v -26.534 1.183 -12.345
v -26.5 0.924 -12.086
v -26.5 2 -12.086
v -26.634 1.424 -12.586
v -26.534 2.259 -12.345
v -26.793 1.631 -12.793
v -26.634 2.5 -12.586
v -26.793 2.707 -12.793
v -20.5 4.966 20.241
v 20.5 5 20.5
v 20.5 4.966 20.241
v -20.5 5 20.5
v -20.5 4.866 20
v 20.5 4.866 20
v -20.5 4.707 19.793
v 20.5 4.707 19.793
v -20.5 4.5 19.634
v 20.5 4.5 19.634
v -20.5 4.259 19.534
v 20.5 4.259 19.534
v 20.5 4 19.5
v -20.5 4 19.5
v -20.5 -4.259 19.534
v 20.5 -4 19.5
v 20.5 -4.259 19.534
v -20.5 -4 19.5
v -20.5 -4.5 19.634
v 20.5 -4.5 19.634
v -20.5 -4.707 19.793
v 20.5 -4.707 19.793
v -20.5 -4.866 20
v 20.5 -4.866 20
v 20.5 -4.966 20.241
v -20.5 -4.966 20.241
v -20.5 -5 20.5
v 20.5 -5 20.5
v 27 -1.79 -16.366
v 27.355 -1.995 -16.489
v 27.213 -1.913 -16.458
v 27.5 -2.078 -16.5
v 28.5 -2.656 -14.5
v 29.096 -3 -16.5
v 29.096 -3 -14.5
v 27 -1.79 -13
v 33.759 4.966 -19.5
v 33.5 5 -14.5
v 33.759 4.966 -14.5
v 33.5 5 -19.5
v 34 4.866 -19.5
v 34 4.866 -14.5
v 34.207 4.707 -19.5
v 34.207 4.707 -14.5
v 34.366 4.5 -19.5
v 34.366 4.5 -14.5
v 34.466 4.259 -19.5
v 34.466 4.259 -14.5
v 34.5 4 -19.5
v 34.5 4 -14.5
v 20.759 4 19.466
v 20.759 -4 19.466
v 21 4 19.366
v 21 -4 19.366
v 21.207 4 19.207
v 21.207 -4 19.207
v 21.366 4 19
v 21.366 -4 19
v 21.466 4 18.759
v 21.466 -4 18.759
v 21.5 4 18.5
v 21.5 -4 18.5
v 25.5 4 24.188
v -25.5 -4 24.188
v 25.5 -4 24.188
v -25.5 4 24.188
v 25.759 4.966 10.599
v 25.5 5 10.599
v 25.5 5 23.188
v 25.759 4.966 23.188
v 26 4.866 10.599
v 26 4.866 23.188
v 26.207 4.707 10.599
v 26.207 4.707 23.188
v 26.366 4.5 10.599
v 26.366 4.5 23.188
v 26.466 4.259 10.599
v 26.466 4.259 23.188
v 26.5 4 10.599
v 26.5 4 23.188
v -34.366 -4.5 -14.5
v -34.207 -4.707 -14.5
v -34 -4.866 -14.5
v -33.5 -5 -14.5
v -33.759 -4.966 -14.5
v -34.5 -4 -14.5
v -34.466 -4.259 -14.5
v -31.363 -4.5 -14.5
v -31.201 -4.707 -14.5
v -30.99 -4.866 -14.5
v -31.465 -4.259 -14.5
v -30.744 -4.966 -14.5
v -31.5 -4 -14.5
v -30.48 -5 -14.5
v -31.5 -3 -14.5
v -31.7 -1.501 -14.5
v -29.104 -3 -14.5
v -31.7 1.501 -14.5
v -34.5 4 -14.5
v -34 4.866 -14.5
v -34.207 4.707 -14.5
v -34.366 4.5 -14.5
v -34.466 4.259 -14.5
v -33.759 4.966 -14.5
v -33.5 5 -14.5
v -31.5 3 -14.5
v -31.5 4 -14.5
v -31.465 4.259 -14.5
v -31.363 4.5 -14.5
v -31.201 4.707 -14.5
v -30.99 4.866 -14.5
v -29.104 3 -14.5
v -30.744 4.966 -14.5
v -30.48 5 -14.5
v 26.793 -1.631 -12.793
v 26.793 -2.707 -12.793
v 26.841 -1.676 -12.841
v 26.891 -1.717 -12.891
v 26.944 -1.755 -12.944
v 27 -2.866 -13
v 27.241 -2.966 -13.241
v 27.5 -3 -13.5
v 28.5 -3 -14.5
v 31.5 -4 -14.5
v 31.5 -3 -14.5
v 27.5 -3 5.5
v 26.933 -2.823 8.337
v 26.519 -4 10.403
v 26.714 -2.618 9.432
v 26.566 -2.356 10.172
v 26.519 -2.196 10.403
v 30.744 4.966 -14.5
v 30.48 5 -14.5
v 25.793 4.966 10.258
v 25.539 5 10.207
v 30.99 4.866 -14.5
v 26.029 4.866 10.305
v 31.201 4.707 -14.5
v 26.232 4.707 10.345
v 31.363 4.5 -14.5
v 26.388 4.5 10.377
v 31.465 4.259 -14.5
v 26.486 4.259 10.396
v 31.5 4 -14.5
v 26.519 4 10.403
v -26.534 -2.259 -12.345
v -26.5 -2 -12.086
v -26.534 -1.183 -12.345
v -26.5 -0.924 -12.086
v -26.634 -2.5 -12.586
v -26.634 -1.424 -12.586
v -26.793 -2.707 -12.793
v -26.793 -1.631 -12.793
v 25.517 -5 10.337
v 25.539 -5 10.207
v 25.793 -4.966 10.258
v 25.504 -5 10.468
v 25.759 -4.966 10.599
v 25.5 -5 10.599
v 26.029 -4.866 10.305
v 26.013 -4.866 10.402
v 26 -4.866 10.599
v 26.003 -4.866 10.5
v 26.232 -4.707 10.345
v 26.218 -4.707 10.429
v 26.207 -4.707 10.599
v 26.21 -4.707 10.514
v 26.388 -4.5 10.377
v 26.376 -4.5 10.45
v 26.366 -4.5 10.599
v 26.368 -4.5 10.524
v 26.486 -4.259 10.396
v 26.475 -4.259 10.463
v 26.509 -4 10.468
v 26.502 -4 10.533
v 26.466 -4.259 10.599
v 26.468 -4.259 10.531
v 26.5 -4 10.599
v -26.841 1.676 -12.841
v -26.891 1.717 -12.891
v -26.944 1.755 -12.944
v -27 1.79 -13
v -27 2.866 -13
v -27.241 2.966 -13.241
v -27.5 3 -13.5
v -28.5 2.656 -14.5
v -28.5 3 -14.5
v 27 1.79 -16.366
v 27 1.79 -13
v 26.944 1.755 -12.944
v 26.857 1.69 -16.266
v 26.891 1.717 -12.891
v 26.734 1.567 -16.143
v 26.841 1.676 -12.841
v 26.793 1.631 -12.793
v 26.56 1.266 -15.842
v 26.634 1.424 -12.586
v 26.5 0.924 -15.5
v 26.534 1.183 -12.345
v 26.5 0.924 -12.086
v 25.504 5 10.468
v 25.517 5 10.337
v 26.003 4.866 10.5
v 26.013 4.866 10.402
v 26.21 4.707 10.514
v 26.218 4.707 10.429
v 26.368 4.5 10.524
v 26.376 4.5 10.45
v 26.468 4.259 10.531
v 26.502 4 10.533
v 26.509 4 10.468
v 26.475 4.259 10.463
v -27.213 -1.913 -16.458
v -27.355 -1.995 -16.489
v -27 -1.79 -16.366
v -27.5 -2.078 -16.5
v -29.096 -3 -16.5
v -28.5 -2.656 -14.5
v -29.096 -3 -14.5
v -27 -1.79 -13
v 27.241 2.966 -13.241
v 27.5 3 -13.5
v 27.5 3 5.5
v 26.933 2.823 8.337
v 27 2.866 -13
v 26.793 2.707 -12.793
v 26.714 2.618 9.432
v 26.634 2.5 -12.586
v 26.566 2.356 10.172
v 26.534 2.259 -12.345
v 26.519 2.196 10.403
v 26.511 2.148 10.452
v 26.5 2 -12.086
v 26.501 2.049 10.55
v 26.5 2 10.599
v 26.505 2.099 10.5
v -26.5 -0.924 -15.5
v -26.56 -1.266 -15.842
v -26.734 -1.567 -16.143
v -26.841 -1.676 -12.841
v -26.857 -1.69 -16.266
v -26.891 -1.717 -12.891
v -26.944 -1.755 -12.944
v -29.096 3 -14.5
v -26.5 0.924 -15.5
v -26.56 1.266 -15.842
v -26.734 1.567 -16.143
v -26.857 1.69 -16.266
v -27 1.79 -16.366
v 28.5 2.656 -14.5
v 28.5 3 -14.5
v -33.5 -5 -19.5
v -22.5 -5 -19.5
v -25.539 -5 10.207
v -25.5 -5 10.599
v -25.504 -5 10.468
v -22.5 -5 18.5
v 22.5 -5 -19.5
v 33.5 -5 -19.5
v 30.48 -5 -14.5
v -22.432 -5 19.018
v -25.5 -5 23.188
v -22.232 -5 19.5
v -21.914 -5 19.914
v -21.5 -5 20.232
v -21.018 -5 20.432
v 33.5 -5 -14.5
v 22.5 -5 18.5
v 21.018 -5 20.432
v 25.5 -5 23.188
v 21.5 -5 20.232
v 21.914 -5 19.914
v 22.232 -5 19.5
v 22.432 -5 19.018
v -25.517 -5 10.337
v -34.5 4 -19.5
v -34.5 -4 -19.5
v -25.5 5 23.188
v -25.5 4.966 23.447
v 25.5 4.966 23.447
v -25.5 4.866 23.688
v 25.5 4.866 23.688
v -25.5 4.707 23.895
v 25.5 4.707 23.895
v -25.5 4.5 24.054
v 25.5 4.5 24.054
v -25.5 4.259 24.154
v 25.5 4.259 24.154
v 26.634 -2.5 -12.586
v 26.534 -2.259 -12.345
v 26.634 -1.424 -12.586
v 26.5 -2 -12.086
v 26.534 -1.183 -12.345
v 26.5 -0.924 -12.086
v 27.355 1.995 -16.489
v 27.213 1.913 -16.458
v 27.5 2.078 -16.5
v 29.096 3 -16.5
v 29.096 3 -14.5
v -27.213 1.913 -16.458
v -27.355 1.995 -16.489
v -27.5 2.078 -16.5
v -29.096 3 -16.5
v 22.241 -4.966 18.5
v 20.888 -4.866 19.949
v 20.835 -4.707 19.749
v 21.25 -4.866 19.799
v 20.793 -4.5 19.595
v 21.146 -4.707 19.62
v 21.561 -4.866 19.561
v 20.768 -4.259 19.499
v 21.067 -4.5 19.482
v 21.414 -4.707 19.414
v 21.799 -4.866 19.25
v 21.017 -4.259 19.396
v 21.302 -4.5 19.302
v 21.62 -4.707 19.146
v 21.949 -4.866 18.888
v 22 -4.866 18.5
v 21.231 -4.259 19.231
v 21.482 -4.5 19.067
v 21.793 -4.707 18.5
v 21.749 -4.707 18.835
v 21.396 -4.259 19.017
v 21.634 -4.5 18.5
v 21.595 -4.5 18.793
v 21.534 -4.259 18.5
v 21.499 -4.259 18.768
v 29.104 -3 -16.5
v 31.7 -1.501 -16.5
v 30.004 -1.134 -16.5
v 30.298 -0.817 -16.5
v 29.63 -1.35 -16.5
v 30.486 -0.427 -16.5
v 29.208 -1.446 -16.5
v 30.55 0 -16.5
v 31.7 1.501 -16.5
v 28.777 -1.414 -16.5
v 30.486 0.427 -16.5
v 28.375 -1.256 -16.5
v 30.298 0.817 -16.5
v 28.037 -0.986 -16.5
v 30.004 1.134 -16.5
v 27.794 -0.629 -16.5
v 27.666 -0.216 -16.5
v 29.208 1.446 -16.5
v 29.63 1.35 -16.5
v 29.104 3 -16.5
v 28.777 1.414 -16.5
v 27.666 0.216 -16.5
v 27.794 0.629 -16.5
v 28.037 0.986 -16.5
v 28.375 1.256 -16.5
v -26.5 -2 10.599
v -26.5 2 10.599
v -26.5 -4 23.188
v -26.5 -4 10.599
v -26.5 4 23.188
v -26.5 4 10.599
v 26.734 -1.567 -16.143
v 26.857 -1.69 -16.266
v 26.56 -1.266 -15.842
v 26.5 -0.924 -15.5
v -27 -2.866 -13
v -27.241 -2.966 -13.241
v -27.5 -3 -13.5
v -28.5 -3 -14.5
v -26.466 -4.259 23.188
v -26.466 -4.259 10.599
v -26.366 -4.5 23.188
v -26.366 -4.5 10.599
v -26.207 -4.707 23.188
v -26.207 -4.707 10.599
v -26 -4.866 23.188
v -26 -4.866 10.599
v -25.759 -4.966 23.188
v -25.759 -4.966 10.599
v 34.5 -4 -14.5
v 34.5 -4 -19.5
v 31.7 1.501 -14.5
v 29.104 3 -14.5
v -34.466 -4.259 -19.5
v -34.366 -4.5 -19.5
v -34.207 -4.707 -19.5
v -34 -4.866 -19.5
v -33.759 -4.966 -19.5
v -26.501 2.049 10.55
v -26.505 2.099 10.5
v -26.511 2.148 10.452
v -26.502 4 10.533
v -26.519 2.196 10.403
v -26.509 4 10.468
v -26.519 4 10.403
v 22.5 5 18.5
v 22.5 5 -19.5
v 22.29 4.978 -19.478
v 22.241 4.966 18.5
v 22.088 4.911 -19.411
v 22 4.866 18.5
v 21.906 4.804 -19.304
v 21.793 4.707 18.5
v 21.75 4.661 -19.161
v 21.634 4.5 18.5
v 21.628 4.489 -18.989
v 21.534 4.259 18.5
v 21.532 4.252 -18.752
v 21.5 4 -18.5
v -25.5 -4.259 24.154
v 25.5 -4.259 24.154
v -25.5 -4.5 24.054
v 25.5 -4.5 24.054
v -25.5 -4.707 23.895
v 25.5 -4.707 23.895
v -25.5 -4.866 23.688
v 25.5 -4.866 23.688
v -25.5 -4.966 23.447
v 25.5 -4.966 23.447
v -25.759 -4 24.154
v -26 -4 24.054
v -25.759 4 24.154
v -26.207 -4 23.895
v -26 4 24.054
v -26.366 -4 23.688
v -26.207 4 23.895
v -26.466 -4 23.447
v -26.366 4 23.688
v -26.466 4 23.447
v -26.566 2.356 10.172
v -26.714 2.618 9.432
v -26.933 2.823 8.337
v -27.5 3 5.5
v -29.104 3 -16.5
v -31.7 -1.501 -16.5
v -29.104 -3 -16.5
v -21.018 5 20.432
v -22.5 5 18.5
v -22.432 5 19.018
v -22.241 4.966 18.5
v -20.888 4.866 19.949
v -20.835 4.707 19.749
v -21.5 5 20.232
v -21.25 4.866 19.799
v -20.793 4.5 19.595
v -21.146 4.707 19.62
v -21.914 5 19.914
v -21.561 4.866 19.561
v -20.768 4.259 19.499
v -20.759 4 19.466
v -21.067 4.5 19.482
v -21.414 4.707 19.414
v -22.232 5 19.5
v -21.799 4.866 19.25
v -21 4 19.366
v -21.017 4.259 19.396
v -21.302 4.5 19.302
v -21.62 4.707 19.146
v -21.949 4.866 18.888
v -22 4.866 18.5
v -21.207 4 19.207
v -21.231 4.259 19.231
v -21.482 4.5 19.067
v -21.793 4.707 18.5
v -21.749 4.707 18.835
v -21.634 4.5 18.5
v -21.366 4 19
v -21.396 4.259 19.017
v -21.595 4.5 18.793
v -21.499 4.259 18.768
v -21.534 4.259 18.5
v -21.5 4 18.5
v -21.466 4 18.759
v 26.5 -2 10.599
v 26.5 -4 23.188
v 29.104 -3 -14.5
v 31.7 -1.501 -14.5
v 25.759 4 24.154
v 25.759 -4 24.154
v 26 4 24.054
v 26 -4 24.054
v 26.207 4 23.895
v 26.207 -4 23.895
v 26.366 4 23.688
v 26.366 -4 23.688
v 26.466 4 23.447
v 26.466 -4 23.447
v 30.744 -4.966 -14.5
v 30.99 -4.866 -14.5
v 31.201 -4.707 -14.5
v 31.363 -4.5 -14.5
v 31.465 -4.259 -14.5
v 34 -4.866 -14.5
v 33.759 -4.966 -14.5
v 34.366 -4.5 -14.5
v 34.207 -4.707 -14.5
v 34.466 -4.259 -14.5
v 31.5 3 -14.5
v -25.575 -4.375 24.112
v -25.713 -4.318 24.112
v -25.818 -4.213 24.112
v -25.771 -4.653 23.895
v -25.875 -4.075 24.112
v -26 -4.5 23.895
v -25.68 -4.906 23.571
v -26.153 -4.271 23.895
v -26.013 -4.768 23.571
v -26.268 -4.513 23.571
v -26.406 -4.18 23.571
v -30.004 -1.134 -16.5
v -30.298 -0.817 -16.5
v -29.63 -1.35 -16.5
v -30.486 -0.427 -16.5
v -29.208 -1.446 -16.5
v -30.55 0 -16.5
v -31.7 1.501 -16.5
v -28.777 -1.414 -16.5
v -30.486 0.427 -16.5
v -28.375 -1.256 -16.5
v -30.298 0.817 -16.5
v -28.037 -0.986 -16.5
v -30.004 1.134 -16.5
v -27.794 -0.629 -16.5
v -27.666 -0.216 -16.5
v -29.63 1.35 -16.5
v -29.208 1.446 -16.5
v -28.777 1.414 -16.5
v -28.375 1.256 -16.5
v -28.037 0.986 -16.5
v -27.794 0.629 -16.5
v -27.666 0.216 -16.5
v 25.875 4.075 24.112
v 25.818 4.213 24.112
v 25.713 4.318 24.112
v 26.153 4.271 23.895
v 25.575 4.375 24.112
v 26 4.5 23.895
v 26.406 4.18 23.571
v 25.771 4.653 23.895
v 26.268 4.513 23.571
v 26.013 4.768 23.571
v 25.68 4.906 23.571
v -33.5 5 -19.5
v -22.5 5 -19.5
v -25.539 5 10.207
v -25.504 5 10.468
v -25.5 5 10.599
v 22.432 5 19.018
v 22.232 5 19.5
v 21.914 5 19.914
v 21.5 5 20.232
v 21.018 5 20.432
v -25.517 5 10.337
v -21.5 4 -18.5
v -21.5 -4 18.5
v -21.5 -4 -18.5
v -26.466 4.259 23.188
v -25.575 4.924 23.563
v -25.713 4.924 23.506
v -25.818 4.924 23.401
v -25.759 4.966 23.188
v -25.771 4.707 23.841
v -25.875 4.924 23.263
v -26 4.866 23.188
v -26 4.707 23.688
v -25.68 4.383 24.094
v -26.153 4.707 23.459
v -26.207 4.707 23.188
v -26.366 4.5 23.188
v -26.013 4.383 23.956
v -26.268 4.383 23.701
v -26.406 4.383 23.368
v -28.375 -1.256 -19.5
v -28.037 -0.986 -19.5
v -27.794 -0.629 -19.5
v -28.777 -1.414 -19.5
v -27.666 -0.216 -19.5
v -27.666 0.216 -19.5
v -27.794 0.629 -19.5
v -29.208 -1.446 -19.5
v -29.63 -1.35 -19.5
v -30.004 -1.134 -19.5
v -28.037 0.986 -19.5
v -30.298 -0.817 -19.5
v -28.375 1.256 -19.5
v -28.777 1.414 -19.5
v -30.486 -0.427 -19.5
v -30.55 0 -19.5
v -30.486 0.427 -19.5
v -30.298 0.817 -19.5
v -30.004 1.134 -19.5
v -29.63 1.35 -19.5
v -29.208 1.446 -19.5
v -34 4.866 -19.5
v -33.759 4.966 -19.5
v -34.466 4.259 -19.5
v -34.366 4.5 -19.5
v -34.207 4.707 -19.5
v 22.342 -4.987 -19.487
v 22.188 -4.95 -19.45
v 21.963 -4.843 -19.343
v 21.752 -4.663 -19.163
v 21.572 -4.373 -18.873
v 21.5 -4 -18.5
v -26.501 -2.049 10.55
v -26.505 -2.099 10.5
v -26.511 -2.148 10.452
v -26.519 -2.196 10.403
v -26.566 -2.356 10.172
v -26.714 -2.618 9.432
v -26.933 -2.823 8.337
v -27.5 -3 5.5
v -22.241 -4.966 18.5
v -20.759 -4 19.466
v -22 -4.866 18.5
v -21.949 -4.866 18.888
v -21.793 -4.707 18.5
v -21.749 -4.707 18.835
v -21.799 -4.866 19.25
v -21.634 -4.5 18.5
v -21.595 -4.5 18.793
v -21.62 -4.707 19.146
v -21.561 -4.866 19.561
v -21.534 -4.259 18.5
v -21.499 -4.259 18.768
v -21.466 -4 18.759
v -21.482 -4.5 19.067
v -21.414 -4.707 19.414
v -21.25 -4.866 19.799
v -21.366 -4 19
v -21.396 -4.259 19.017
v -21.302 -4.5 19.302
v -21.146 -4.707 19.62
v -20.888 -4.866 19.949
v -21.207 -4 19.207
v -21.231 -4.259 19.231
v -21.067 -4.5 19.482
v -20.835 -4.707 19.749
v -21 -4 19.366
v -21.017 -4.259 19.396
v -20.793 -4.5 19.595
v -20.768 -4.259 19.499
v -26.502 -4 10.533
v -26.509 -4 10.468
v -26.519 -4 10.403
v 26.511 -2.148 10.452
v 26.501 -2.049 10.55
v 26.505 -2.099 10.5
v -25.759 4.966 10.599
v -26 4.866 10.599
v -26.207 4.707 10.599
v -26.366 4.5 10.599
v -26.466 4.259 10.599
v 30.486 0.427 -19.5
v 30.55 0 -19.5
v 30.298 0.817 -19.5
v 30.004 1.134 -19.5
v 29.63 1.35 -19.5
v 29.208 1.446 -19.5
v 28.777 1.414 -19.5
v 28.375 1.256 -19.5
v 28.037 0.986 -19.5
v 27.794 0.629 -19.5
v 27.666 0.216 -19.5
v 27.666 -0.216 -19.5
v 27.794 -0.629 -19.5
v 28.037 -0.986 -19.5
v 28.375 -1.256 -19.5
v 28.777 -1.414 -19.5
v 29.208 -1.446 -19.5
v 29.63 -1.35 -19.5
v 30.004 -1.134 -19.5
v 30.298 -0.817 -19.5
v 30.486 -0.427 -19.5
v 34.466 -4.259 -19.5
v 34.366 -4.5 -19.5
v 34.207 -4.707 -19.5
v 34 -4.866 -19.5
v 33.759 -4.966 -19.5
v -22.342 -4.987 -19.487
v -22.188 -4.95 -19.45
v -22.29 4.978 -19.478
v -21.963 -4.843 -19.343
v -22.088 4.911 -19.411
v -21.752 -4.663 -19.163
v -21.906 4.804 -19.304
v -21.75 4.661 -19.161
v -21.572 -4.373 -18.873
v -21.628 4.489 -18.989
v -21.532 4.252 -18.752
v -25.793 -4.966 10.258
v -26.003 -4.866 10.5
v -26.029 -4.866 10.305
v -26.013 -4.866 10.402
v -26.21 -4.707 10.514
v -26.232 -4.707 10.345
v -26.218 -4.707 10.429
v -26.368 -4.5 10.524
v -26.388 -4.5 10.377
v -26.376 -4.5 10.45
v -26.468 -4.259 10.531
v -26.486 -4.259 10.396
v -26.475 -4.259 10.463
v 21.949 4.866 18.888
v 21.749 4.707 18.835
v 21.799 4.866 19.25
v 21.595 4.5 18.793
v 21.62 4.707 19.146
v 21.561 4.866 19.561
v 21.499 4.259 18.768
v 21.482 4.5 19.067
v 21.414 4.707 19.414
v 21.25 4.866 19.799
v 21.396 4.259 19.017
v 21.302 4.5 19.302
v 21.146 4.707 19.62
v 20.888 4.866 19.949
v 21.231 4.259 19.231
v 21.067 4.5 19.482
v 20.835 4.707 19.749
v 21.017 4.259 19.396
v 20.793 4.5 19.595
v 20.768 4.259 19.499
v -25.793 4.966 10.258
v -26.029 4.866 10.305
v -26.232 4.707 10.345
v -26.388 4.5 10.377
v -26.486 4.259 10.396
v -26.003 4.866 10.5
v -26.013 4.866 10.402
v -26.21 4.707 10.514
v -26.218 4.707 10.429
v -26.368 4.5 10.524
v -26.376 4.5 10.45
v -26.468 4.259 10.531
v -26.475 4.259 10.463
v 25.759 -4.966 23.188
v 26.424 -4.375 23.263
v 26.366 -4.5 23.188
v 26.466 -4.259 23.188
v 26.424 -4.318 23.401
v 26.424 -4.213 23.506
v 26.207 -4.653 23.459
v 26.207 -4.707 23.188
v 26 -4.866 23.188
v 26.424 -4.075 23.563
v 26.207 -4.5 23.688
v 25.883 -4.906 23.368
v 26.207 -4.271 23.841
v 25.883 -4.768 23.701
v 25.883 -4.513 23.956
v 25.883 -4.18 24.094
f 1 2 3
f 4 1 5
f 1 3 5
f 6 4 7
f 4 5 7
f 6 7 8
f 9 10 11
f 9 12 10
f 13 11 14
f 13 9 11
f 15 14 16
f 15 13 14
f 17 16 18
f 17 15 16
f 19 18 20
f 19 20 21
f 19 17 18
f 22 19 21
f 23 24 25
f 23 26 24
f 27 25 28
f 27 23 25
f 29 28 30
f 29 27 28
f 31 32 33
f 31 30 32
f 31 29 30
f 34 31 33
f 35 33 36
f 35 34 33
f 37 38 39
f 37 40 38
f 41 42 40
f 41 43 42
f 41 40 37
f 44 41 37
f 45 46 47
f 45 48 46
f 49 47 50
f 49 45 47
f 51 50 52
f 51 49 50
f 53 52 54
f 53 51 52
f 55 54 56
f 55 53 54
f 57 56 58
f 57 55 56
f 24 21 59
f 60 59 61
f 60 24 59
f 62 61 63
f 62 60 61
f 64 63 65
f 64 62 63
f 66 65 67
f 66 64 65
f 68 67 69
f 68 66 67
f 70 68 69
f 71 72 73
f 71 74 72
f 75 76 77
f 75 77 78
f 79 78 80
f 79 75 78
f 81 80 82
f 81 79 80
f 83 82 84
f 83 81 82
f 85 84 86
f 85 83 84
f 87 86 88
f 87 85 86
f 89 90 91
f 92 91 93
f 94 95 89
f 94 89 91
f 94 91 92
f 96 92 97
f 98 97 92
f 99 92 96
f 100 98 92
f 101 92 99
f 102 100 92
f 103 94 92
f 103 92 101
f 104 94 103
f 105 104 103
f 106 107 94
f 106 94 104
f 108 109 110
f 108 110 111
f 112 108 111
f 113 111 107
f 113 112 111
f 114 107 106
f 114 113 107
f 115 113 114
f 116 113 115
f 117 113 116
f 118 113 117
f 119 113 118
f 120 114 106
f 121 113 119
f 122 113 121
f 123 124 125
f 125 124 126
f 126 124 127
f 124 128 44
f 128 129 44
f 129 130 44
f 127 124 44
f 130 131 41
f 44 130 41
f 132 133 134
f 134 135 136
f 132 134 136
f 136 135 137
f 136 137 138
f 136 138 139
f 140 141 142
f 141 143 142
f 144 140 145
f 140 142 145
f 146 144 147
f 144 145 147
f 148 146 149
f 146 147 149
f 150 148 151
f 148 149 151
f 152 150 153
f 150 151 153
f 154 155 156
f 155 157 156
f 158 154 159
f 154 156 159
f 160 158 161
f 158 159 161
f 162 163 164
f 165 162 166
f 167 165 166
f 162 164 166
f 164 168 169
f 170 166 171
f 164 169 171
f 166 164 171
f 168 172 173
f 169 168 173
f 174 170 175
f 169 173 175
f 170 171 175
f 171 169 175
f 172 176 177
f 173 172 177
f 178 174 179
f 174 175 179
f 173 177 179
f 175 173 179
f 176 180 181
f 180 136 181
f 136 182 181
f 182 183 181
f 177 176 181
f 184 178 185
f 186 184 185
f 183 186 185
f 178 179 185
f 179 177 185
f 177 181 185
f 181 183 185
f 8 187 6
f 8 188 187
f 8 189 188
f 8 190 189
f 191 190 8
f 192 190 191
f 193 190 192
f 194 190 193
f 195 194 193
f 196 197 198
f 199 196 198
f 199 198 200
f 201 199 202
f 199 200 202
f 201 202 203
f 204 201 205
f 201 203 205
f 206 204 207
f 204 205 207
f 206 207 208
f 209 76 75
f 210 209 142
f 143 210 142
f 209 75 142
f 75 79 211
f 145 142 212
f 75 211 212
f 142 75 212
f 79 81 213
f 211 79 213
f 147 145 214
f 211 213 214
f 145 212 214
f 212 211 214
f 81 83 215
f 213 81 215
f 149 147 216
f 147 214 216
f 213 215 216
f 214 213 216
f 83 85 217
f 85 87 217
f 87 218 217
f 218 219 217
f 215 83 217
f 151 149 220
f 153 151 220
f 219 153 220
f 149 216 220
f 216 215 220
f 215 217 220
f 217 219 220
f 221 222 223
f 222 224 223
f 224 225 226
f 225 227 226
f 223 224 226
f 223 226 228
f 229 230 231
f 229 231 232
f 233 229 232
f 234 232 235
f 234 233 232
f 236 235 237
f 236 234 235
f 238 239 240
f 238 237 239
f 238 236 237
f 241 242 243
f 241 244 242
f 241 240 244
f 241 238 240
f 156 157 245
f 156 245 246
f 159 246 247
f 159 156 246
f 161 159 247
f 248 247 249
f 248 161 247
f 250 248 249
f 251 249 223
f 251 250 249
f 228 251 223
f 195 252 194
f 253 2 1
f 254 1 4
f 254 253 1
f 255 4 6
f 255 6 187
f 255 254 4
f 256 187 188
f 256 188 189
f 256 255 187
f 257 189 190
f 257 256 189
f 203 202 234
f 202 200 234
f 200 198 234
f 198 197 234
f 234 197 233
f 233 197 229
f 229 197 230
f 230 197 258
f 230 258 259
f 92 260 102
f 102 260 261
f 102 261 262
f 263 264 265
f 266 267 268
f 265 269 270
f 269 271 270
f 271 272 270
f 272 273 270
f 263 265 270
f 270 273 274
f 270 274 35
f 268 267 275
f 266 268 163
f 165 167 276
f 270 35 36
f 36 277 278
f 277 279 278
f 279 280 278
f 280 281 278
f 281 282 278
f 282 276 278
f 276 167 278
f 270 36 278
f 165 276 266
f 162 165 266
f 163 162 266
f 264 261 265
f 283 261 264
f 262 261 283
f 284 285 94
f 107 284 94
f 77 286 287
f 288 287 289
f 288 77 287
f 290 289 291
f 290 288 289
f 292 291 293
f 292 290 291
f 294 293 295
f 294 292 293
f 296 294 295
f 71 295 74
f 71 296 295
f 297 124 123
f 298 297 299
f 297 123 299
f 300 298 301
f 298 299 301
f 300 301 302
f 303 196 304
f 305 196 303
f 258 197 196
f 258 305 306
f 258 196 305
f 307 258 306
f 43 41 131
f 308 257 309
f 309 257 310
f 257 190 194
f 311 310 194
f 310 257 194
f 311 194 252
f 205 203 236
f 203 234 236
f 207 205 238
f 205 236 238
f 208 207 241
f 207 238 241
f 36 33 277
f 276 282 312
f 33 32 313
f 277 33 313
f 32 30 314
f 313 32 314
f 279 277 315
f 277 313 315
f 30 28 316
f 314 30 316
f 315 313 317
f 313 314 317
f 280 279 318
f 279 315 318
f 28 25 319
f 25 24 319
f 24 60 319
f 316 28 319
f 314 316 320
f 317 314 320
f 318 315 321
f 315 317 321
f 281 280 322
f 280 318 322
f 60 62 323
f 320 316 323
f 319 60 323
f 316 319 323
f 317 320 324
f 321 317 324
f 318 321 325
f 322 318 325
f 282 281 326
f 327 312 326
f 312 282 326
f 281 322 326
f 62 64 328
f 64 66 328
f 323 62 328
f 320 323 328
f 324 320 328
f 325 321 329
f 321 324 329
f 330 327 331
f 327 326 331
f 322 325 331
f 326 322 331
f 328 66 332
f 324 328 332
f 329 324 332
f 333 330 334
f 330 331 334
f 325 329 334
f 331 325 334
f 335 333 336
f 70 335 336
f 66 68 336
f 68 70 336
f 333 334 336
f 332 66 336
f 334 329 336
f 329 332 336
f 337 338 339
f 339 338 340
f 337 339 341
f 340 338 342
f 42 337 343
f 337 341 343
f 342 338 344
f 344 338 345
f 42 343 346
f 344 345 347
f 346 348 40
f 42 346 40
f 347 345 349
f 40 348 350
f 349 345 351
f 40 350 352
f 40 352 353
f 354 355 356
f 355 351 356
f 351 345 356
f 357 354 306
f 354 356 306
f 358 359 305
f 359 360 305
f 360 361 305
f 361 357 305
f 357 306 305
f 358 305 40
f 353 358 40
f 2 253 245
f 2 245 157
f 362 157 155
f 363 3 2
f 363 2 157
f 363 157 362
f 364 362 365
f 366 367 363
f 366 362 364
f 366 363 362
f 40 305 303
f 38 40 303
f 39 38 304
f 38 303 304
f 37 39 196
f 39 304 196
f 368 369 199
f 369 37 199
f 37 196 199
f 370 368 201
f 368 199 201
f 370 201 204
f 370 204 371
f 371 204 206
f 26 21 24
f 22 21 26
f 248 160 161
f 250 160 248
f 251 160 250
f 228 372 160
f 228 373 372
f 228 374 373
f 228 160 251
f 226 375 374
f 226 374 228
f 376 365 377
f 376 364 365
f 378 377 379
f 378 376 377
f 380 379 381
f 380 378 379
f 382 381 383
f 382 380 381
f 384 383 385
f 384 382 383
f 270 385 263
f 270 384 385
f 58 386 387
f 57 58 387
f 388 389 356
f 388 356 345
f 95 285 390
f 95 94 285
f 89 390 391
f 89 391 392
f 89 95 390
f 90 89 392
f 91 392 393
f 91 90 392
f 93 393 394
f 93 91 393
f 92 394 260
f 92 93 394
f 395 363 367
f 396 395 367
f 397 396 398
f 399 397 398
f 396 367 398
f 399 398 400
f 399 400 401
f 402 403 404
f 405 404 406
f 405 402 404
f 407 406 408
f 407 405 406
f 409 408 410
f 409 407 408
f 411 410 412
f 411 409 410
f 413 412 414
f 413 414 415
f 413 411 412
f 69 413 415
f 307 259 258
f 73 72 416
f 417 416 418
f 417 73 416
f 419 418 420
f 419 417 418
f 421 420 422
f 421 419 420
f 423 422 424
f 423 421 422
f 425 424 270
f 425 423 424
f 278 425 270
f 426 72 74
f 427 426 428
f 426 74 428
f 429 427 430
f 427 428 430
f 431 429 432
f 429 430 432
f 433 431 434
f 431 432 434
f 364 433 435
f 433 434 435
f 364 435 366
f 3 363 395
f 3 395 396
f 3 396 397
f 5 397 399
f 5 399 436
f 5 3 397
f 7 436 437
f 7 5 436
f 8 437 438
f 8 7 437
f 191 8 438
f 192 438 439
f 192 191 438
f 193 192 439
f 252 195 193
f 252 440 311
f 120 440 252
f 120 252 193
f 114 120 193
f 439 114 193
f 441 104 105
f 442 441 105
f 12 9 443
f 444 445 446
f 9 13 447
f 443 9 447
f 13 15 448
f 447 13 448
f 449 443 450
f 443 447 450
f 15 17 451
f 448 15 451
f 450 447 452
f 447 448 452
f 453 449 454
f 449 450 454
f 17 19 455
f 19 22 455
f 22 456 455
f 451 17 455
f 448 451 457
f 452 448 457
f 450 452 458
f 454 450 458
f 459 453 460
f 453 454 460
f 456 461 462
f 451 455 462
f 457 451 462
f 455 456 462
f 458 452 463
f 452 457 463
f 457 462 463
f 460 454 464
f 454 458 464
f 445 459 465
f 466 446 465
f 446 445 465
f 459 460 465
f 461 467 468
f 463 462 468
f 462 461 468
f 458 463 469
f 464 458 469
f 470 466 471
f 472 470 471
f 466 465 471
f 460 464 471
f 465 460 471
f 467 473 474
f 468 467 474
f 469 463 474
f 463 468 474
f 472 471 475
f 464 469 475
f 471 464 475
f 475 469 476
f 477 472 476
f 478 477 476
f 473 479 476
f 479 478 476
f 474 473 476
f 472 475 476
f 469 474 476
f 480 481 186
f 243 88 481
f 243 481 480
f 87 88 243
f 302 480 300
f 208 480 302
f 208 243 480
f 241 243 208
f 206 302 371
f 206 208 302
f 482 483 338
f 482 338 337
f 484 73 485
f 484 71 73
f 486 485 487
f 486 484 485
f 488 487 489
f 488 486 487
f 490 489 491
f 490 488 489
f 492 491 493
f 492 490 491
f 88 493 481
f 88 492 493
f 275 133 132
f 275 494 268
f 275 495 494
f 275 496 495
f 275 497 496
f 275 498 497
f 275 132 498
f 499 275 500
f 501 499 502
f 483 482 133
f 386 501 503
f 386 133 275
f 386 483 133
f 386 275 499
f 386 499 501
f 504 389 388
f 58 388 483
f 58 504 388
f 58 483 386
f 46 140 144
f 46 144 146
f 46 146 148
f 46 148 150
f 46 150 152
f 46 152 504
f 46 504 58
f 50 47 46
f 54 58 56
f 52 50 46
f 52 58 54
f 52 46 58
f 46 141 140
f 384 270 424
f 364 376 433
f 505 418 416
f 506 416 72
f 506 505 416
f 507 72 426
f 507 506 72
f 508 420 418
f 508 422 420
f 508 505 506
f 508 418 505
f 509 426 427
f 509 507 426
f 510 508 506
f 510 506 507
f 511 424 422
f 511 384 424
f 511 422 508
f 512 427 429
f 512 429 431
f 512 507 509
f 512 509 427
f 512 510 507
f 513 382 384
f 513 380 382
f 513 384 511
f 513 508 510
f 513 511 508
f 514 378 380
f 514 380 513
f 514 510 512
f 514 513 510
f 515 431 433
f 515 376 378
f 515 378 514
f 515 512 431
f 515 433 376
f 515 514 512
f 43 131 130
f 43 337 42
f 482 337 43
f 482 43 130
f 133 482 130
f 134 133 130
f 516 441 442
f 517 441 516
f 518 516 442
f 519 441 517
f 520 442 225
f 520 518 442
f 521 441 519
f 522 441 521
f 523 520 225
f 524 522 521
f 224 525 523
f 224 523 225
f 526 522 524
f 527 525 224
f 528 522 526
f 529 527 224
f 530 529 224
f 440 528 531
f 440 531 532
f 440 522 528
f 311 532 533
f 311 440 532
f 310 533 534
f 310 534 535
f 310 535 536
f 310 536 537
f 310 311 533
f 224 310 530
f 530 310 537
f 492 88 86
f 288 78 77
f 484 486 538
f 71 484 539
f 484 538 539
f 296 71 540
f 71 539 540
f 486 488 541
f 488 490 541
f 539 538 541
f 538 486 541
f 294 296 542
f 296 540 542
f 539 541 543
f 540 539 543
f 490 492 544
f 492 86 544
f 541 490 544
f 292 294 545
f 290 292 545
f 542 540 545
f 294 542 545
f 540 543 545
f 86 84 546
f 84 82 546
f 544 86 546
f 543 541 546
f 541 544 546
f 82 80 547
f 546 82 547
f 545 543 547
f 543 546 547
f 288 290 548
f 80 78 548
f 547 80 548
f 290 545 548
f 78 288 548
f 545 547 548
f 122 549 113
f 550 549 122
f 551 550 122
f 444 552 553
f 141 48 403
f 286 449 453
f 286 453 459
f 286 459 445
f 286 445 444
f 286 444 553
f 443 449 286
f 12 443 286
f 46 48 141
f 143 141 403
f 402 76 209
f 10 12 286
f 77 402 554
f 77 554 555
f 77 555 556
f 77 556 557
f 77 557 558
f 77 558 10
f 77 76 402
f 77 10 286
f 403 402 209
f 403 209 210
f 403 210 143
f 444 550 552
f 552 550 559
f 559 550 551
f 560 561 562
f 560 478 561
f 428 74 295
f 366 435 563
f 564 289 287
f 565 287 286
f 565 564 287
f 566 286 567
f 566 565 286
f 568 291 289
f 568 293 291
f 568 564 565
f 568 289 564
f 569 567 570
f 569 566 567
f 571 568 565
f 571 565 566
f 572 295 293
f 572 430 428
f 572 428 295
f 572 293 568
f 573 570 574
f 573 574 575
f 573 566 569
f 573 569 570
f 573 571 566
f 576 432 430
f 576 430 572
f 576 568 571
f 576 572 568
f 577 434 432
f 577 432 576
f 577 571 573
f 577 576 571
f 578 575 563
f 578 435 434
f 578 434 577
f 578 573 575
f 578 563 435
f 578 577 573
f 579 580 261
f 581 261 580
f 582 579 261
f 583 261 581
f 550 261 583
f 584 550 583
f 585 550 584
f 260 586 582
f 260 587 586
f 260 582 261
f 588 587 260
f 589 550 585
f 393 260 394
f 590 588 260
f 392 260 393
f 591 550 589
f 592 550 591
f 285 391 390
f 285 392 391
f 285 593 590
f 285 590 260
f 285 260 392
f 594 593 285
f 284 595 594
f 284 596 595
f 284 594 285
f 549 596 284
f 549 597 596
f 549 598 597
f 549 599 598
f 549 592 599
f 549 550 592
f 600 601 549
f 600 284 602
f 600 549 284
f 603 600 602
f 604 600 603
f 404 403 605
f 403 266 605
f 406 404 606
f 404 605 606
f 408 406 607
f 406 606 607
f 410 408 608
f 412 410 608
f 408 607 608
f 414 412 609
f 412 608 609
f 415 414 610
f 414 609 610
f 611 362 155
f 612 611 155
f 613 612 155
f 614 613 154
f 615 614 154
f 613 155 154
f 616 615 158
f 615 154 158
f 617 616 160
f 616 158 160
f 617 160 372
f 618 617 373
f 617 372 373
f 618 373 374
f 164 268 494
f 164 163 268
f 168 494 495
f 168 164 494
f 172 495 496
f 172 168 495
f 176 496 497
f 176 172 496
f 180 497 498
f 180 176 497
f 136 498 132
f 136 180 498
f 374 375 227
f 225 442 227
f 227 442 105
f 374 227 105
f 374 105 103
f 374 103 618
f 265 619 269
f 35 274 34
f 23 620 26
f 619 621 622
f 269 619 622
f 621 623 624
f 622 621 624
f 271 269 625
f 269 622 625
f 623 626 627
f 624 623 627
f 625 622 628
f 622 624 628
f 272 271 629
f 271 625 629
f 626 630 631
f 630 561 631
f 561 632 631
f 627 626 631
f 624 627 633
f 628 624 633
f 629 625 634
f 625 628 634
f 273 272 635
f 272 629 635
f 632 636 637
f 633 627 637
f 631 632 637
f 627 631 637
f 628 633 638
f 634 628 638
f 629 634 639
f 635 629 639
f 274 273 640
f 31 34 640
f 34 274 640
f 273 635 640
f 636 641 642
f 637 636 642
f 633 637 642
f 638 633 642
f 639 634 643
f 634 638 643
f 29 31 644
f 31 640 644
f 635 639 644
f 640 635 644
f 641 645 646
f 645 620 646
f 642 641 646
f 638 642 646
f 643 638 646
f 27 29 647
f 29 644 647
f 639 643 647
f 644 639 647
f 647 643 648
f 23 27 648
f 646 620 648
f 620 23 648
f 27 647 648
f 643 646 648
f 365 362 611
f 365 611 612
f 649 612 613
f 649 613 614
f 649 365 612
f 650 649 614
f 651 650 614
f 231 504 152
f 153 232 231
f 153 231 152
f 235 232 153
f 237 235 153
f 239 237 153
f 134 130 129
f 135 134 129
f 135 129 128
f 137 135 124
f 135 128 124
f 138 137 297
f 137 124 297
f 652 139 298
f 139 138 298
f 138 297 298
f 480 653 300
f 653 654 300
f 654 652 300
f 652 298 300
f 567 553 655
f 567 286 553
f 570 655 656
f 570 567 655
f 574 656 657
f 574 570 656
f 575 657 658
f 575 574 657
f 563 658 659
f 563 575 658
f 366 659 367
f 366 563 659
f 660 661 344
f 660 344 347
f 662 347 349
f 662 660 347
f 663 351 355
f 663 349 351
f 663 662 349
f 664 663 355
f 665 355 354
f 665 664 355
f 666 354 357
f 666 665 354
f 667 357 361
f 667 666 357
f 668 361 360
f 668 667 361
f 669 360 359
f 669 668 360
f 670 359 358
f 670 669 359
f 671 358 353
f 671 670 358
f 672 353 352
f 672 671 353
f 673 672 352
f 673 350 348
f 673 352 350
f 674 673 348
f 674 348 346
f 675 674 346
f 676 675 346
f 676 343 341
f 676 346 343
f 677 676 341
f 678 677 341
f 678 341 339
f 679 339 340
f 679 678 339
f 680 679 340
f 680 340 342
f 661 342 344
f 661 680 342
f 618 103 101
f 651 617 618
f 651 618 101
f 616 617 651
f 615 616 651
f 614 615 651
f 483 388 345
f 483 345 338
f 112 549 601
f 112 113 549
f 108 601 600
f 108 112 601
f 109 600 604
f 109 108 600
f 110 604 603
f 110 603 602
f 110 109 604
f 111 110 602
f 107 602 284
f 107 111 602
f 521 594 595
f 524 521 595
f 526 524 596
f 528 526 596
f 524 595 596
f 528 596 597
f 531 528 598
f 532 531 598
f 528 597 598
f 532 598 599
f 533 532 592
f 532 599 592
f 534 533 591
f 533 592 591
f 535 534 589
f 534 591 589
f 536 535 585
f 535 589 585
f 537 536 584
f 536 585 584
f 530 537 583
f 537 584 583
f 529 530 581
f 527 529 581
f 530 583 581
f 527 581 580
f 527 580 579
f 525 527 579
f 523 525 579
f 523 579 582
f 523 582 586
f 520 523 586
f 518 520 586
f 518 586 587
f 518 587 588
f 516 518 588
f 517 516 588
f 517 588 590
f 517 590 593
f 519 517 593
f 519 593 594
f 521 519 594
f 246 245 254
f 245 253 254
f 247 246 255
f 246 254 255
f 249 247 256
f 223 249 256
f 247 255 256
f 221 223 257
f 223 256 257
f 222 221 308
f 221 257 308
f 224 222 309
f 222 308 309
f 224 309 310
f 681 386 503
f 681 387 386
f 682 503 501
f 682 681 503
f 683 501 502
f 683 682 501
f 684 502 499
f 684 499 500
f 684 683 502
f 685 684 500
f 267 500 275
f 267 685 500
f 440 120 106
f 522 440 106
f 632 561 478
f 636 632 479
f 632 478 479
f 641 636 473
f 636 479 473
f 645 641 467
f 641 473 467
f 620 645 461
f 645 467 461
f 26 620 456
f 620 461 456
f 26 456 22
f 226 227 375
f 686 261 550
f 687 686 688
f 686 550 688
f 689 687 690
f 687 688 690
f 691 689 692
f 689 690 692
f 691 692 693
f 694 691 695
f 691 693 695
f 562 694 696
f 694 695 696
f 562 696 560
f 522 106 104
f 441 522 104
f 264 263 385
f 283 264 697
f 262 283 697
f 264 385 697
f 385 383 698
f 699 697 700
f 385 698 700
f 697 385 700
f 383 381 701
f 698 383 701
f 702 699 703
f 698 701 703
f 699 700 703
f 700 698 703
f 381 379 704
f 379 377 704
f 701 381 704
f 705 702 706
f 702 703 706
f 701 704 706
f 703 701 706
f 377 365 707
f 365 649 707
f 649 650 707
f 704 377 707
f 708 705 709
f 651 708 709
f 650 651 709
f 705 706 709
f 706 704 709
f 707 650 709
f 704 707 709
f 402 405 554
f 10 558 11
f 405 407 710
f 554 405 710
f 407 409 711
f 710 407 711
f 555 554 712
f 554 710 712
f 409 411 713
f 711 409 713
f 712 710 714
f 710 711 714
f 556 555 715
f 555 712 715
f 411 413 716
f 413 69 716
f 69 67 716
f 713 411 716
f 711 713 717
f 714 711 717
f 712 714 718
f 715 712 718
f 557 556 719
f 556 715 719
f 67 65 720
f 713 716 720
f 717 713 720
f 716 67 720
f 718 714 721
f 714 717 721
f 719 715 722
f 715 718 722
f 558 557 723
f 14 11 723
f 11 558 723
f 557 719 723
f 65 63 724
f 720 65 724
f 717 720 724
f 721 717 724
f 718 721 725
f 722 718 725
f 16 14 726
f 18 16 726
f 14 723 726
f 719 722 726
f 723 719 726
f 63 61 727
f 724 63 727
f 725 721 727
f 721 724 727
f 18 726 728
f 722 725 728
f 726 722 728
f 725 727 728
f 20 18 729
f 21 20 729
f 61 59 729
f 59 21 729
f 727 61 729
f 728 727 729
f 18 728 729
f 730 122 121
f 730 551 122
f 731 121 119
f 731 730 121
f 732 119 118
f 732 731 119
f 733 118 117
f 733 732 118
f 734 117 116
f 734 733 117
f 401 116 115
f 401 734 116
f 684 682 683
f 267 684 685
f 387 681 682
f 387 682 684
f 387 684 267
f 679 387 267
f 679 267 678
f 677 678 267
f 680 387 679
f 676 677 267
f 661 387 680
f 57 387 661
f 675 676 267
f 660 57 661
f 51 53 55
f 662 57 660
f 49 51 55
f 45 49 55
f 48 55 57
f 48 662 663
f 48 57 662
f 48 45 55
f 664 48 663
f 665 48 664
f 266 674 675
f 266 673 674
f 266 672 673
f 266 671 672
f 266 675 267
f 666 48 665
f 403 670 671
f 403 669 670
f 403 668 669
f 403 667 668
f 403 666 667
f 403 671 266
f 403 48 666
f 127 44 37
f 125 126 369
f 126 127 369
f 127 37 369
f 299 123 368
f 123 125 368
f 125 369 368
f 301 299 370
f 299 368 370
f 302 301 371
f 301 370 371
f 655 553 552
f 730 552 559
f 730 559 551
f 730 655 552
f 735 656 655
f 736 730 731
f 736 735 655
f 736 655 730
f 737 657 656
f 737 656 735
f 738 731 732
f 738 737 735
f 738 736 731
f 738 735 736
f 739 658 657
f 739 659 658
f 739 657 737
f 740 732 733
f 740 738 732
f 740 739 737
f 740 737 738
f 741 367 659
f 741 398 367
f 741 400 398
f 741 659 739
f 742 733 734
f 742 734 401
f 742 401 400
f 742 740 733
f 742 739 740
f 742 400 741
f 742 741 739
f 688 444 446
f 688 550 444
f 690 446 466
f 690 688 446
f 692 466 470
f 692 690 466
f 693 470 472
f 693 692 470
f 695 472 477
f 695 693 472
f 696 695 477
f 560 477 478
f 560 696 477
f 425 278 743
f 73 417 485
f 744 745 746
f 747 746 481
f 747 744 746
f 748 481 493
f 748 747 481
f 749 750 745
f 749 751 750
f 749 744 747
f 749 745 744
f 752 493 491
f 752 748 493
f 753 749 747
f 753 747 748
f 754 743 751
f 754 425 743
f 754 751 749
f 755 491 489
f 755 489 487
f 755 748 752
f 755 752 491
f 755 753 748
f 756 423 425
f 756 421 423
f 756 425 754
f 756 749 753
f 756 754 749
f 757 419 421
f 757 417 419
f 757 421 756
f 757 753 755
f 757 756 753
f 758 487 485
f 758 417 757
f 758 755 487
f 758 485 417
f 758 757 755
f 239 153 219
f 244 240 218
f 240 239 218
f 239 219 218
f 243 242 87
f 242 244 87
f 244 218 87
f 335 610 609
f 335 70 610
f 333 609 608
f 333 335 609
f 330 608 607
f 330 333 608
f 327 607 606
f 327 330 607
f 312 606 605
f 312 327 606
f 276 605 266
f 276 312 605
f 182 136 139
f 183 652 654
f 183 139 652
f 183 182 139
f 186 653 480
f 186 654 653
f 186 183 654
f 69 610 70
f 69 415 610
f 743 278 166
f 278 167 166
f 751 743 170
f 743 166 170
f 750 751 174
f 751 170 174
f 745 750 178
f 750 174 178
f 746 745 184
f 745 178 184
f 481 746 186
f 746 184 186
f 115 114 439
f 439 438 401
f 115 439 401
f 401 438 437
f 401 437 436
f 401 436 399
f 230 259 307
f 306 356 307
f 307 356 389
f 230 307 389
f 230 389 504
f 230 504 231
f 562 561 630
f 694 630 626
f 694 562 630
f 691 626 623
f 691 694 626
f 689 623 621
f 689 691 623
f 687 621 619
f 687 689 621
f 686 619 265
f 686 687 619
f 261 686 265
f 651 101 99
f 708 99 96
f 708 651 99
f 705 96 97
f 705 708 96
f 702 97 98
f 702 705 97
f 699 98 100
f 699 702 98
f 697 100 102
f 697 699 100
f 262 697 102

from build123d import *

# Parameters (mm, degrees)
BOSS_EXTRUDE1_DEPTH     = 5
CUT_EXTRUDE1_DEPTH      = 2
M2_5_CLEARANCE_HOLE1_D  = 2.9
RIB1_REACH              = 45.305
SKETCH5_WALL_W          = 114.10480654
SKETCH5_WALL_H          = 2
MIRROR2_COPY_1_REACH    = 45.305
MIRROR2_COPY_1_SKETCH_W = 114.10480654
MIRROR2_COPY_1_SKETCH_H = 2
CHAMFER1_SIZE           = 2
FILLET1_R               = 1


with BuildPart() as part:
    # Sketch1 → Boss-Extrude1 (new, symmetric)
    with BuildSketch(Plane(origin=(0, 0, 0), x_dir=(1, 0, 0), z_dir=(0, 1, 0))):
        Polygon((21.5, -19.5), (-21.5, -19.5), (-21.5, 19.5), (-34.5, 19.5), (-34.5, 14.5), (-26.5, 14.5), (-26.5, -24.188022284), (26.5, -24.188022284), (26.5, 14.5), (34.5, 14.5), (34.5, 19.5), (21.5, 19.5), align=None)
    extrude(amount=BOSS_EXTRUDE1_DEPTH, both=True)

    # Sketch2 → Cut-Extrude1 (cut)
    with BuildSketch(Plane.XY.offset(-14.5)):
        Polygon((-26.5, 1.5011107), (-29.1, 3.0022214), (-31.7, 1.5011107), (-31.7, -1.5011107), (-29.1, -3.0022214), (-26.5, -1.5011107), align=None)
    cut_extrude1 = extrude(amount=-CUT_EXTRUDE1_DEPTH, mode=Mode.SUBTRACT)

    # M2.5 Clearance Hole1 (through all)
    with Locations(Plane.XY.offset(-16.5)):
        with Locations((-29.1, 0)):
            m2_5_clearance_hole1 = Hole(M2_5_CLEARANCE_HOLE1_D / 2)

    # Sketch5 wall → Rib1 (add, up to next)
    with BuildSketch(Plane(origin=(-29, 5, -2), x_dir=(0.196116135138, 0, 0.980580675691), z_dir=(0.980580675691, 0, -0.196116135138)), mode=Mode.PRIVATE) as rib1_sk1:
        with Locations((0, 1)):
            Rectangle(SKETCH5_WALL_W, SKETCH5_WALL_H)
    rib1_tool1 = extrude(rib1_sk1.sketch, amount=RIB1_REACH, mode=Mode.PRIVATE) - part.part
    rib1 = rib1_tool1.solids().sort_by_distance((-29, 5, -2))[0]
    add(rib1)

    # Mirror1: Rib1 across plane
    add(rib1.mirror(Plane.ZX))

    # Mirror2: Cut-Extrude1, M2.5 Clearance Hole1, Rib1 across plane
    add(cut_extrude1.mirror(Plane(origin=(0, 0, 0), x_dir=(0, 0, 1), z_dir=(1, 0, 0))), mode=Mode.SUBTRACT)
    add(m2_5_clearance_hole1.mirror(Plane(origin=(0, 0, 0), x_dir=(0, 0, 1), z_dir=(1, 0, 0))), mode=Mode.SUBTRACT)
    add(rib1.mirror(Plane(origin=(0, 0, 0), x_dir=(0, 0, 1), z_dir=(1, 0, 0))))

    # Mirror2 copy 1 sketch → Mirror2 copy 1 (add, up to next)
    with BuildSketch(Plane(origin=(29, -5, -2), x_dir=(-0.196116135138, 0, 0.980580675691), z_dir=(-0.980580675691, 0, -0.196116135138)), mode=Mode.PRIVATE) as mirror2_copy_1_sk1:
        with Locations((0, 1)):
            Rectangle(MIRROR2_COPY_1_SKETCH_W, MIRROR2_COPY_1_SKETCH_H)
    mirror2_copy_1_tool1 = extrude(mirror2_copy_1_sk1.sketch, amount=MIRROR2_COPY_1_REACH, mode=Mode.PRIVATE) - part.part
    add(mirror2_copy_1_tool1.solids().sort_by_distance((29, -5, -2))[0])

    # Chamfer1
    chamfer1_edges = [part.edges().sort_by_distance(p)[0] for p in [
        (26.5, -2.25055535, -14.5),
        (26.5, 2.25055535, -14.5),
        (-26.5, -2.25055535, -14.5),
        (-26.5, 2.25055535, -14.5),
    ]]
    chamfer(chamfer1_edges, length=CHAMFER1_SIZE)

    # Fillet1
    fillet1_edges = [part.edges().sort_by_distance(p)[0] for p in [
        (-26.5, -5, 17.344011142),
        (-29, -5, -2),
        (-26.5, -3, -1),
        (-26.5, -4, 10.5),
        (0, -5, 24.188022284),
        (26.5, -1.5011107, -14.5),
        (26.5, 1.5011107, -14.5),
        (-34.5, -5, -17),
        (26.5, 0, -16.5),
        (34.5, 5, -17),
        (-21.5, -5, 0),
        (0, -5, 19.5),
        (21.5, -5, 0),
        (26.5, 5, 17.344011142),
        (34.5, -5, -17),
        (29, 5, -2),
        (26.5, 4, 10.5),
        (26.5, -5, 17.344011142),
        (26.5, -4, 10.5),
        (29, -5, -2),
        (26.5, 0, 24.188022284),
        (-26.5, 0, 24.188022284),
        (26.5, -3, -1),
        (-21.5, 0, -19.5),
        (-21.5, 0, 19.5),
        (21.5, 0, 19.5),
        (21.5, 0, -19.5),
        (21.5, 5, 0),
        (26.5, 3, -1),
        (26.5, 2.25055535, -12.5),
        (26.5, -2.25055535, -12.5),
        (-26.5, 3, -1),
        (-26.5, 2.25055535, -12.5),
        (-26.5, -2.25055535, -12.5),
        (0, 5, 19.5),
        (-21.5, 5, 0),
        (-26.5, 0, -16.5),
        (-26.5, 1.5011107, -14.5),
        (-26.5, -1.5011107, -14.5),
        (-34.5, 5, -17),
        (0, 5, 24.188022284),
        (-26.5, 5, 17.344011142),
        (-29, 5, -2),
        (-26.5, 4, 10.5),
    ]]
    fillet(fillet1_edges, radius=FILLET1_R)


solid = part.part
